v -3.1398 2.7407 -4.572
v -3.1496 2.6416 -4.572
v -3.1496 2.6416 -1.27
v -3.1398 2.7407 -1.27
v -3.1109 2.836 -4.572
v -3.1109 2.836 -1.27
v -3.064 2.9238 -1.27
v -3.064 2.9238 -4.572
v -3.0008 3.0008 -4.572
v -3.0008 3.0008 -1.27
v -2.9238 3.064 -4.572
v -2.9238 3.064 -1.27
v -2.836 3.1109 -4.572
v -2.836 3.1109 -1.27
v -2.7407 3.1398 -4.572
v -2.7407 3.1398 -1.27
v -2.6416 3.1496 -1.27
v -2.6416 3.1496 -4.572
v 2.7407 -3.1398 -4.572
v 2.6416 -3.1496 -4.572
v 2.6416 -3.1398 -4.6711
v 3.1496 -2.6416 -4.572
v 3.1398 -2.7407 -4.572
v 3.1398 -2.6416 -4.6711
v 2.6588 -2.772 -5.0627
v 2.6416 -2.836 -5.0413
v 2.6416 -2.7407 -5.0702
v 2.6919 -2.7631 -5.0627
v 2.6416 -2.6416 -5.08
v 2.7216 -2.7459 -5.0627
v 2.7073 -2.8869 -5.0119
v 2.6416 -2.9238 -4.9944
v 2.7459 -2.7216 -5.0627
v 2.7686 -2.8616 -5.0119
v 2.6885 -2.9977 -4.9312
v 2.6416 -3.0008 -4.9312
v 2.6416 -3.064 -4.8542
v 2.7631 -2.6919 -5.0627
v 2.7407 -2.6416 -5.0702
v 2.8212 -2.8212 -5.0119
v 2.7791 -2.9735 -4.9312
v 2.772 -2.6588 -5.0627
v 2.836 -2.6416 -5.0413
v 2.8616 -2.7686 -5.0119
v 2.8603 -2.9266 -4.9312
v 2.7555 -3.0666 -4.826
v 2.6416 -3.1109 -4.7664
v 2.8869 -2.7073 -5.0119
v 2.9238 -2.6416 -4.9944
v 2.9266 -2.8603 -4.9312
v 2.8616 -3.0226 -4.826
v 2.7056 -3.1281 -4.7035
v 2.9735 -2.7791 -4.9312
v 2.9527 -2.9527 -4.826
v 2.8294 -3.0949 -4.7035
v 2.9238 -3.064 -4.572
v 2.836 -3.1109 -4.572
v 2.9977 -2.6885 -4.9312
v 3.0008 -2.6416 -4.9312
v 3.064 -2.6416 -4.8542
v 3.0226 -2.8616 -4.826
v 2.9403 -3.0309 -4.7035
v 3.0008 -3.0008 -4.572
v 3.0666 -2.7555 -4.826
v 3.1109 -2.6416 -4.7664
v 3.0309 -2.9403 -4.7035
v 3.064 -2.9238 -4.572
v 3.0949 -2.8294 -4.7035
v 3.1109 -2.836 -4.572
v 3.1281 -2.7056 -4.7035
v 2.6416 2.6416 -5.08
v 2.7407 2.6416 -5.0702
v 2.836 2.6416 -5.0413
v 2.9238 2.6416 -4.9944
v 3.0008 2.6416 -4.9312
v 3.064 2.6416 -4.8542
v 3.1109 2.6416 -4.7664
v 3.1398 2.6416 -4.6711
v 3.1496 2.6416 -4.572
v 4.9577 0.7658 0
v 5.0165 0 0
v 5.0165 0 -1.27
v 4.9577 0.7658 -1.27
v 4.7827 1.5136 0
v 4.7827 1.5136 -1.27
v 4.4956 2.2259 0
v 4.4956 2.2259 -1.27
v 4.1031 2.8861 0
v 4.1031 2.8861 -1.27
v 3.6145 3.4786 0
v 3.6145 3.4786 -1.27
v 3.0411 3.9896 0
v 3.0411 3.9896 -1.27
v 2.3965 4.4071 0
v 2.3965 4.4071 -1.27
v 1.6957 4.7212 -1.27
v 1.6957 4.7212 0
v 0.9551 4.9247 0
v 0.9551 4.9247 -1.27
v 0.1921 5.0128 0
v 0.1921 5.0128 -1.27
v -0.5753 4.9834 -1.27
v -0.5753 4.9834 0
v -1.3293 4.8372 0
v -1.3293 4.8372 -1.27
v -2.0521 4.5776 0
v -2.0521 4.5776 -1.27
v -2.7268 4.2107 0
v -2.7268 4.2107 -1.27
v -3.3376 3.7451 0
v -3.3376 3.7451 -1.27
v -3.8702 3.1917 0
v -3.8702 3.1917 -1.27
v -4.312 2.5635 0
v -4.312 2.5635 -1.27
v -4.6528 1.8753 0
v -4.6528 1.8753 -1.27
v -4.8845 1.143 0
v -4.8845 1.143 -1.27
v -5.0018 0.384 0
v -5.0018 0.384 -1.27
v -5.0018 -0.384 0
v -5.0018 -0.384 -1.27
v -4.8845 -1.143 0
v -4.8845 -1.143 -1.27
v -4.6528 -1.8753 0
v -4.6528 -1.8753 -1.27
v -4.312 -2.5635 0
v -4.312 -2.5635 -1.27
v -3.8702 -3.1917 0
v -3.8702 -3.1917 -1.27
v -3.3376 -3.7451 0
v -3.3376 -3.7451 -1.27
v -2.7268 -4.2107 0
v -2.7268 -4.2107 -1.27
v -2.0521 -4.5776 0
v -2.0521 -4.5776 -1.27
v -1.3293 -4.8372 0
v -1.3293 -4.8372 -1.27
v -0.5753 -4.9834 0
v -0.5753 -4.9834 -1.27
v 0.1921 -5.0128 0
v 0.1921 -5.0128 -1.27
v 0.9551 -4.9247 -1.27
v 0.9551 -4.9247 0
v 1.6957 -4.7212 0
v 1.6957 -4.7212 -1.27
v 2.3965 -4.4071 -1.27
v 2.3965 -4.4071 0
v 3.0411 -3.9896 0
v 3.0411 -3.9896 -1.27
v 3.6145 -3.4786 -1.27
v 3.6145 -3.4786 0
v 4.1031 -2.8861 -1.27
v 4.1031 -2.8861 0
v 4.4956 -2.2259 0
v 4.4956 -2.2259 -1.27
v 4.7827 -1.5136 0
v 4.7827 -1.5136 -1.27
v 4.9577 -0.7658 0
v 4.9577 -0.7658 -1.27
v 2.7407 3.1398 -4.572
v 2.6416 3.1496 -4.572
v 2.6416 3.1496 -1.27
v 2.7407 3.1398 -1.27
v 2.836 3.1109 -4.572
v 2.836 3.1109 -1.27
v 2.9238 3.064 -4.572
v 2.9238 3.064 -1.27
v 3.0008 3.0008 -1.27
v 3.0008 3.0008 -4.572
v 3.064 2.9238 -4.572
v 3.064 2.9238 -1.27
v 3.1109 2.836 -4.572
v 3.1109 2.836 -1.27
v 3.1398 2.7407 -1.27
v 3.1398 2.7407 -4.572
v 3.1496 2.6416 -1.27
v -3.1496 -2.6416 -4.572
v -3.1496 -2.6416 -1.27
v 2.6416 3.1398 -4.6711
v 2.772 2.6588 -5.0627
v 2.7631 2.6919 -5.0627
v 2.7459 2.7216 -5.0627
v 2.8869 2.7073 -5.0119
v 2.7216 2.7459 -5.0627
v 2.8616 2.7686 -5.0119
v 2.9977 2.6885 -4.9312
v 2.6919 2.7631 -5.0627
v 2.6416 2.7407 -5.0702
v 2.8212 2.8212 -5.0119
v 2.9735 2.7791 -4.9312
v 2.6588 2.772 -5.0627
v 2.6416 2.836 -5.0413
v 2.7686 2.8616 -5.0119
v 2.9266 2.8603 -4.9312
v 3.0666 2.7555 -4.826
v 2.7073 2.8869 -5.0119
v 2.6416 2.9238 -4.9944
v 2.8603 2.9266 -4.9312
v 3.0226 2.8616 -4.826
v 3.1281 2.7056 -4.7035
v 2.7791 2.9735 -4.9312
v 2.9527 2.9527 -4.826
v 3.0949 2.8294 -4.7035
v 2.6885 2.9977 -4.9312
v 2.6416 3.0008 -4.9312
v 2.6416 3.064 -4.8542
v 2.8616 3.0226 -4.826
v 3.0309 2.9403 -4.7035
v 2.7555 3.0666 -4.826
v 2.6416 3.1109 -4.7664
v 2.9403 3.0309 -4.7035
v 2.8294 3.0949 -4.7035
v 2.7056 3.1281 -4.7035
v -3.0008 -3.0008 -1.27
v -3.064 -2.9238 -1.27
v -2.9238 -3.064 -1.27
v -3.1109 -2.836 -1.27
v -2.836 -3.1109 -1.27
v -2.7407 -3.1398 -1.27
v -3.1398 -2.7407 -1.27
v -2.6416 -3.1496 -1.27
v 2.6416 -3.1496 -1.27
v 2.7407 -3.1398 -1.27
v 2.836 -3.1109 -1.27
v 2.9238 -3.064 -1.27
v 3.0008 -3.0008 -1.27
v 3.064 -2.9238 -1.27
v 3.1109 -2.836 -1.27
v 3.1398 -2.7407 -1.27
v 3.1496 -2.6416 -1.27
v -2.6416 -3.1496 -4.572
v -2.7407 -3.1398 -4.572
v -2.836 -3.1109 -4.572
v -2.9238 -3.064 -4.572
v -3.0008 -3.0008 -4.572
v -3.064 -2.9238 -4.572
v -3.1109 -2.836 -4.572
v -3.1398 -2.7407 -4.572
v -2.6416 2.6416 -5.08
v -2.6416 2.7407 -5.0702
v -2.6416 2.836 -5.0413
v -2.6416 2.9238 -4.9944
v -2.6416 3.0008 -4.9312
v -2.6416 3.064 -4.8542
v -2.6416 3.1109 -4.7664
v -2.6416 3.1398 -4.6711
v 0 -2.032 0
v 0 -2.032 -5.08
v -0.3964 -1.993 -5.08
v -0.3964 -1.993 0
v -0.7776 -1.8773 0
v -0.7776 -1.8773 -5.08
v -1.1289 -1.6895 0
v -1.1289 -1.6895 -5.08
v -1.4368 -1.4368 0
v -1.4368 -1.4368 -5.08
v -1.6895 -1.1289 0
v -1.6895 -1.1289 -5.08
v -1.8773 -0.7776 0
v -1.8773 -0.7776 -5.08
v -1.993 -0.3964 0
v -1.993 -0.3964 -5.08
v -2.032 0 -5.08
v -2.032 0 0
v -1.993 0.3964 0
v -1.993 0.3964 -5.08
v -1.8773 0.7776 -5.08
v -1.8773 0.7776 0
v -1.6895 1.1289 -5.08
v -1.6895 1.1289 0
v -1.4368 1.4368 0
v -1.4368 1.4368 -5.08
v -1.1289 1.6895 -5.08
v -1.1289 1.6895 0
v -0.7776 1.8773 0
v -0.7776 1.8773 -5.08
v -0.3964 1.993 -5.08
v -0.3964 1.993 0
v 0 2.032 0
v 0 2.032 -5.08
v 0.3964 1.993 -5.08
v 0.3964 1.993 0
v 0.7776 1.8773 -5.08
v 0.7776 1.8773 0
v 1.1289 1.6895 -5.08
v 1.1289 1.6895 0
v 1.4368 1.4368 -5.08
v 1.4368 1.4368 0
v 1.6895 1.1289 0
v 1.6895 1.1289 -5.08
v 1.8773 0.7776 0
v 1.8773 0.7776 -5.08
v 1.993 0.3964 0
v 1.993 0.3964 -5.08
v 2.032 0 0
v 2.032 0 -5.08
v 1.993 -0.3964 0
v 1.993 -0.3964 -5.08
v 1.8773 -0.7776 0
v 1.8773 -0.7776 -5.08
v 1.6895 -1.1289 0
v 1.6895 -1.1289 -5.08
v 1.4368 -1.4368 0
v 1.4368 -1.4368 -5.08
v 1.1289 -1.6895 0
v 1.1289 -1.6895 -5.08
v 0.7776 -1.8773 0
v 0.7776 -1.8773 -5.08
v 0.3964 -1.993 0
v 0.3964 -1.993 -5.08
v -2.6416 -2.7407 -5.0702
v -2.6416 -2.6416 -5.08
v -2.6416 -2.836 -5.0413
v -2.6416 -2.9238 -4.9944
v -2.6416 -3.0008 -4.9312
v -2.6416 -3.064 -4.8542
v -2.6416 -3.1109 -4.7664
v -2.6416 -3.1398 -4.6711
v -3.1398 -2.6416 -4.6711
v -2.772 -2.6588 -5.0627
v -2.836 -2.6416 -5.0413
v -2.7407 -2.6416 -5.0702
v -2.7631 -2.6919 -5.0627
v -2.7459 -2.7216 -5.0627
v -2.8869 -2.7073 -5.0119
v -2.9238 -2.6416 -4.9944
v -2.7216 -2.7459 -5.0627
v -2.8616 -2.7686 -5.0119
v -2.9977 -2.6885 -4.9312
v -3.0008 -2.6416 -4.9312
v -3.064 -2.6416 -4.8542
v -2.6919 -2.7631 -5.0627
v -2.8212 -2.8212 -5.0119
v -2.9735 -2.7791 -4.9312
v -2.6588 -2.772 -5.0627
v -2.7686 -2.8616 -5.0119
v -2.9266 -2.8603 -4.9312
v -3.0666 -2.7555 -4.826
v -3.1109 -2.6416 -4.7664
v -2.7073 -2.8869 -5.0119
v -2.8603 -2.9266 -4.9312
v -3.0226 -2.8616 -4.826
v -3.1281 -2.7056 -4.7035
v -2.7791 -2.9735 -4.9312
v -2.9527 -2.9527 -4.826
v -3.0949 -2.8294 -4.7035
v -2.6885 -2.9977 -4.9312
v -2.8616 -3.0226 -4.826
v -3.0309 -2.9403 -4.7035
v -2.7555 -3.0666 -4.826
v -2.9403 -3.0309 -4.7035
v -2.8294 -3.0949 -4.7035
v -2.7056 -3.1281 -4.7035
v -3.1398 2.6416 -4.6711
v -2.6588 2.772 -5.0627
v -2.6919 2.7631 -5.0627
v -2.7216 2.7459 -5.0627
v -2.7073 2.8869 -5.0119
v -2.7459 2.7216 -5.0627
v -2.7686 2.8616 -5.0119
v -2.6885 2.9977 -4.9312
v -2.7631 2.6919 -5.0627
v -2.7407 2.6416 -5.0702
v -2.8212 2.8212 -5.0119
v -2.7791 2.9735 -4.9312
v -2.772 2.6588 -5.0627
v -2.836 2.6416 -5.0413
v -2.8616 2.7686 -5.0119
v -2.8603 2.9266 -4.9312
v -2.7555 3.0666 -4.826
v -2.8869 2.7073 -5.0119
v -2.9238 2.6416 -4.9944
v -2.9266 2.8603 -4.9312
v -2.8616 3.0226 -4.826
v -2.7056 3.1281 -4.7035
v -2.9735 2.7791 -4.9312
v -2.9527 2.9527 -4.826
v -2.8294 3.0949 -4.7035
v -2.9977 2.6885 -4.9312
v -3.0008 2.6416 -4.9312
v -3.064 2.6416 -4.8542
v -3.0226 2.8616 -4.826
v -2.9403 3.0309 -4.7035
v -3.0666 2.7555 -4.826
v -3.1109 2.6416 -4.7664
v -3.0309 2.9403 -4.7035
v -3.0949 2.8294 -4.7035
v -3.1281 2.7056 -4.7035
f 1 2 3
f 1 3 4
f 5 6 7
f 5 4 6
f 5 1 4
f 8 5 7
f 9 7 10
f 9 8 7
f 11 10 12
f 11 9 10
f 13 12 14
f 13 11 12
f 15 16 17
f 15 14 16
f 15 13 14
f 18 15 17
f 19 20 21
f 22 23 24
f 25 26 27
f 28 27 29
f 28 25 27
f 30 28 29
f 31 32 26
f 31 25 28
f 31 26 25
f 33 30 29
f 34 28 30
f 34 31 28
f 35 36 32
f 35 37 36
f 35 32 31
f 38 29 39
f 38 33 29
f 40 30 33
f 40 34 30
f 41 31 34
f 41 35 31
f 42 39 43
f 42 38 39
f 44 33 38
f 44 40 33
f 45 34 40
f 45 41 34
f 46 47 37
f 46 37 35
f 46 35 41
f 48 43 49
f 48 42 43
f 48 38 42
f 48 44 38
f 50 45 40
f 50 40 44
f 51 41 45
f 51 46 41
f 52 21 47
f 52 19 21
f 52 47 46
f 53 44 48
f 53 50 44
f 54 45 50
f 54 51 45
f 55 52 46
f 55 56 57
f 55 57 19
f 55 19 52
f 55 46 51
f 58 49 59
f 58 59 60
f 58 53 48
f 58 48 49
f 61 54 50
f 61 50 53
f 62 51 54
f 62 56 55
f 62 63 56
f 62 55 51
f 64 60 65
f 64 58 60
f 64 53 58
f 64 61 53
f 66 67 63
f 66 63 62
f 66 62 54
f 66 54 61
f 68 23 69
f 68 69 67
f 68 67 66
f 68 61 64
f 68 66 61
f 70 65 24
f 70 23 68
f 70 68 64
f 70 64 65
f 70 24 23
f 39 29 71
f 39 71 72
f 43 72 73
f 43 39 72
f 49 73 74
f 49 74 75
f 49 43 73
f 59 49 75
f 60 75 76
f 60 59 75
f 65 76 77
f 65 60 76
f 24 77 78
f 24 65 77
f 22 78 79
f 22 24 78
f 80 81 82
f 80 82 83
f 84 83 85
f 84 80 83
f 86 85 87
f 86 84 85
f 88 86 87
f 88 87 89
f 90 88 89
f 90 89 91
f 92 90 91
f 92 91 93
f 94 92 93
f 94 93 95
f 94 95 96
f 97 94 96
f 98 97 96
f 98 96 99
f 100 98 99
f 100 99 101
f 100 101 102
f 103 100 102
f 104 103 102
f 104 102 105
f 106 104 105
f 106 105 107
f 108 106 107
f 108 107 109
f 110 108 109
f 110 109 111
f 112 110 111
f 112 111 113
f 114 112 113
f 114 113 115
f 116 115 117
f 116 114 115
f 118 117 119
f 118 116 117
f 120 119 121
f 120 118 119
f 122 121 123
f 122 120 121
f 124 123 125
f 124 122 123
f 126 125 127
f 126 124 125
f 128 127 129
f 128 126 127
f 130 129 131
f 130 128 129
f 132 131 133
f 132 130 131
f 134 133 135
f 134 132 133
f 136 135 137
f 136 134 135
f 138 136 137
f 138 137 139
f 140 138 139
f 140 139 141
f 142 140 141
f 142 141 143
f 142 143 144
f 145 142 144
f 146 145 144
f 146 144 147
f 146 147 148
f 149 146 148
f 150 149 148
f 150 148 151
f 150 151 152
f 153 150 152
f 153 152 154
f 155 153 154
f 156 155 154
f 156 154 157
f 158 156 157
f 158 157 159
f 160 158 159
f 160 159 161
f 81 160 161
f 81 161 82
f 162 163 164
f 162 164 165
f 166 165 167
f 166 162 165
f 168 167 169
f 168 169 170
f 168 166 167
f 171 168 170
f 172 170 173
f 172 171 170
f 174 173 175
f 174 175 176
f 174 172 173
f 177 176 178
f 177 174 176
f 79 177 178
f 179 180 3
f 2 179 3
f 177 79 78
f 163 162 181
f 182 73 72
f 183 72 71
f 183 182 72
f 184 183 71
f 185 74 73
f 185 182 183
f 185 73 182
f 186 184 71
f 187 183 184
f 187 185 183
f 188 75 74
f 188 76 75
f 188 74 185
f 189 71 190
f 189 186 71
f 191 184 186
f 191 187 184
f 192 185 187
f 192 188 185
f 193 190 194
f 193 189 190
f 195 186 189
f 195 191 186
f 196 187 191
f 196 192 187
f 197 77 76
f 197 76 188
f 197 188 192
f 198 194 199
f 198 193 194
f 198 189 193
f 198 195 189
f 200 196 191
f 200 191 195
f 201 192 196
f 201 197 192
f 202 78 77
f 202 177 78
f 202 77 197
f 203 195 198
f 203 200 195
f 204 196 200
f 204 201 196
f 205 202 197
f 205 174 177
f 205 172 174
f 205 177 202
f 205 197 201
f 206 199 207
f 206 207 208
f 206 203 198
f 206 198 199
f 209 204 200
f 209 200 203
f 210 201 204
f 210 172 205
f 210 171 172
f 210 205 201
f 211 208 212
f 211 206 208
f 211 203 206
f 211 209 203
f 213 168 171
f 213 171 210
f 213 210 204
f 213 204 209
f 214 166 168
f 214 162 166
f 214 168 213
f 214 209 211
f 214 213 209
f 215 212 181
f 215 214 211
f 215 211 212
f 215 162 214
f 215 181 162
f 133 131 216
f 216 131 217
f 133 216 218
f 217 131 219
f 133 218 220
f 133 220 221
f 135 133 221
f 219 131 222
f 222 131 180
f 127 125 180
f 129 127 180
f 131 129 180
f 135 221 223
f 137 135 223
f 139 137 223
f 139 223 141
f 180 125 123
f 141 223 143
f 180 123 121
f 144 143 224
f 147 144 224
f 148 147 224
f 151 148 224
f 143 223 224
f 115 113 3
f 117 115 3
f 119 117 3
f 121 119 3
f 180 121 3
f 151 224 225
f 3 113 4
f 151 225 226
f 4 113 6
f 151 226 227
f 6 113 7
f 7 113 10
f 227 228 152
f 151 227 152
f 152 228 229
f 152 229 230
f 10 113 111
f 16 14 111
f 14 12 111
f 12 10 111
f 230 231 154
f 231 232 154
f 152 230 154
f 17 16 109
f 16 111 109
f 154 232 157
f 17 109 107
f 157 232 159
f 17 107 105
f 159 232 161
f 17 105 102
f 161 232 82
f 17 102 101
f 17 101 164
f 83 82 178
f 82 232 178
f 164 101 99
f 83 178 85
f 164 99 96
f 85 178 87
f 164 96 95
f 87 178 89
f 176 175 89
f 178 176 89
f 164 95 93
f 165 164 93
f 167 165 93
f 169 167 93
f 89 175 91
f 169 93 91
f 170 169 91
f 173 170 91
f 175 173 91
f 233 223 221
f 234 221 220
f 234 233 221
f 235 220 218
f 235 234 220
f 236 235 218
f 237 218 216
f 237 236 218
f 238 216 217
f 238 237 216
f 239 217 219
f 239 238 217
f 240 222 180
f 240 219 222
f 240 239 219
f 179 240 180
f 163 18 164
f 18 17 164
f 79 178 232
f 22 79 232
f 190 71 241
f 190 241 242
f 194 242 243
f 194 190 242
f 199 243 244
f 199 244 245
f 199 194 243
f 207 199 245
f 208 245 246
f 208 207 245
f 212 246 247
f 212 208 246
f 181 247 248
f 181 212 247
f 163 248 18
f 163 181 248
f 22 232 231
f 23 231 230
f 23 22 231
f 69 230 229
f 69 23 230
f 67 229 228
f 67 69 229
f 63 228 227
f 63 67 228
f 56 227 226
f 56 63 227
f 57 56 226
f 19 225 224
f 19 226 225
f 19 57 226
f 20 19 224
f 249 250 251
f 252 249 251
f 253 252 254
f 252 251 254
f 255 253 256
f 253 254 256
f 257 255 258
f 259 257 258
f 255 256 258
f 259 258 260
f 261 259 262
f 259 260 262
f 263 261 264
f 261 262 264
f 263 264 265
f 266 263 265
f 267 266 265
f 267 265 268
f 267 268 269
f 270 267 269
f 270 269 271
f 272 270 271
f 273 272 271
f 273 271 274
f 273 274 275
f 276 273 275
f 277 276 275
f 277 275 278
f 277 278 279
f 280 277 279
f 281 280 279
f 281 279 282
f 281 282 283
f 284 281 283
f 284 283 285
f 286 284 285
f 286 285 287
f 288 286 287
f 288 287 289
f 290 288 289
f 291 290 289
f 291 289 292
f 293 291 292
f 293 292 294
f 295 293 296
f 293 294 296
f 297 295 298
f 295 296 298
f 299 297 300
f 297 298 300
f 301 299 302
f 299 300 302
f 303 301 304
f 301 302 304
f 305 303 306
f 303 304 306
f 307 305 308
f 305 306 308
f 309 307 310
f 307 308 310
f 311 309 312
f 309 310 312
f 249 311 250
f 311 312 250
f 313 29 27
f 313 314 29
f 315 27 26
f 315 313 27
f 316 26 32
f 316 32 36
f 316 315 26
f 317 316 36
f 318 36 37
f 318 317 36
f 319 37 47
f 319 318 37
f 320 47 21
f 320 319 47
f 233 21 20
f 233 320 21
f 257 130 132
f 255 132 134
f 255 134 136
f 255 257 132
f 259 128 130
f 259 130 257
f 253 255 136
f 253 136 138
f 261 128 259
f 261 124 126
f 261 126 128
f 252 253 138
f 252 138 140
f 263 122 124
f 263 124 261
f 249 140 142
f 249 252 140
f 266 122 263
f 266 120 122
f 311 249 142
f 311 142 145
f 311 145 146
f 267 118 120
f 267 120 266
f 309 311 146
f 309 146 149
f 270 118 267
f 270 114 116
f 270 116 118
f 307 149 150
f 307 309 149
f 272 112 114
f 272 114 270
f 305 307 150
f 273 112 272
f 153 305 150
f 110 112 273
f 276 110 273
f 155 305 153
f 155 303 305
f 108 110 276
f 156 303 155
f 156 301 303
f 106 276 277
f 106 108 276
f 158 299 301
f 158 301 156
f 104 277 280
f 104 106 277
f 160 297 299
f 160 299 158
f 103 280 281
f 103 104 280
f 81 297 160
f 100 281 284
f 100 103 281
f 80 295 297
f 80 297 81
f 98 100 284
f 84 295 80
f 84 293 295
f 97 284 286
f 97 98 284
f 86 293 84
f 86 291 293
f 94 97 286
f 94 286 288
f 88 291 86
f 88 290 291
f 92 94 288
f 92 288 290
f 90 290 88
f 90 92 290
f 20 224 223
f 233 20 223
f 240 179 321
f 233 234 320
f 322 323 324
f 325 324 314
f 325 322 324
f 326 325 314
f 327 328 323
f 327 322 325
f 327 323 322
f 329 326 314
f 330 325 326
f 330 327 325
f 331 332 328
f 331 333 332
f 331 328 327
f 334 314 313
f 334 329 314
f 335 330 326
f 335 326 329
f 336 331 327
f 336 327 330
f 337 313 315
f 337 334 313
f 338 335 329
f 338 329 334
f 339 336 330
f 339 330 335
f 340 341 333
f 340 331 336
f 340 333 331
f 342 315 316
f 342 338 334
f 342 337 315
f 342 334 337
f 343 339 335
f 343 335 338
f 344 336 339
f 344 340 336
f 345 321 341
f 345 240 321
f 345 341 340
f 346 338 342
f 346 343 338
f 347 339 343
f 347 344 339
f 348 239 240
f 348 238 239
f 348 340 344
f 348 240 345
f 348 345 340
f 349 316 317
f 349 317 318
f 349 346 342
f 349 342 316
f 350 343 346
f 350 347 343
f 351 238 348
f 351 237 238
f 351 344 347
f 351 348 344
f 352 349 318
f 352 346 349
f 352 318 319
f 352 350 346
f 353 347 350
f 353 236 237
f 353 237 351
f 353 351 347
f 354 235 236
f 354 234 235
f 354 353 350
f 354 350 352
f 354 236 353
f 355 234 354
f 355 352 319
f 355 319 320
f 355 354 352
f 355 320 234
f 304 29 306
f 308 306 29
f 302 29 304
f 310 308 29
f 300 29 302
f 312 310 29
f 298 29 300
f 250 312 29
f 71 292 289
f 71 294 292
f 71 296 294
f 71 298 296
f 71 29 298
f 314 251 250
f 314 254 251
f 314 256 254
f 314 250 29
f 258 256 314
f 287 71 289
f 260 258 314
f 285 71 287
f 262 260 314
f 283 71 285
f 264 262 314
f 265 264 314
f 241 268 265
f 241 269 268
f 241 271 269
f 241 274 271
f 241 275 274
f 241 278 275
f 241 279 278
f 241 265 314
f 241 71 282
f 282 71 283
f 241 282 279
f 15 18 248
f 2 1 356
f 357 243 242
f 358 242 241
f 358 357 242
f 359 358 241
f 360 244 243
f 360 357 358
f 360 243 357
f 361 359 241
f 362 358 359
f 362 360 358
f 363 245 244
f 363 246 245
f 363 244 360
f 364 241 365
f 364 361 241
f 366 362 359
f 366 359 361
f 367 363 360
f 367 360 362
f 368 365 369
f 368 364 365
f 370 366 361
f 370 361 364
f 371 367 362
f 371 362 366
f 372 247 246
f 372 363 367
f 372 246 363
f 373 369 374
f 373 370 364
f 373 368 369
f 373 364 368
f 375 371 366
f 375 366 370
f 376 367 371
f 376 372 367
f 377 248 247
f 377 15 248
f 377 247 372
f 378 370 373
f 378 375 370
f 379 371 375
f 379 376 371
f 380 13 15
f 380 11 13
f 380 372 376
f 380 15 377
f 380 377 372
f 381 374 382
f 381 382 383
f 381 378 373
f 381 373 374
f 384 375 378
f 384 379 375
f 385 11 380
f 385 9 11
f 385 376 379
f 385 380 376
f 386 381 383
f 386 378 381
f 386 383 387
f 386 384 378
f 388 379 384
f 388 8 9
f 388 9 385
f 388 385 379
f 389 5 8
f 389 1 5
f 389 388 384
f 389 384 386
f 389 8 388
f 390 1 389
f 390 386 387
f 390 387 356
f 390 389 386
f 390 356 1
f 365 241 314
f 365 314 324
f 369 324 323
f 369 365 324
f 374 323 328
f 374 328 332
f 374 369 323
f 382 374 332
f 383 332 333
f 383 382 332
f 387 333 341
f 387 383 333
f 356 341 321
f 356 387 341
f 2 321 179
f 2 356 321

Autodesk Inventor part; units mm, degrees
ref_plane "YZ Plane" through (0, 0, 0) normal (1, 0, 0) x (0, 1, 0)
ref_plane "XZ Plane" through (0, 0, 0) normal (0, 1, 0) x (-1, 0, 0)
ref_plane "XY Plane" through (0, 0, 0) normal (0, 0, 1) x (1, 0, 0)
sketch "Sketch1" plane through (0, 0, 0) normal (0, 0, 1) x (1, 0, 0)
  circle A0 centre (0, 0) radius 5.0165
  dimension "d0" = 10.033
extrude "Extrusion1" add sketch "Sketch1" against normal blind 1.27
sketch "Sketch2" plane through (0, 0, -1.27) normal (0, 0, -1) x (-1, 0, 0)
  circle A0 centre (0, 0) radius 5.0165 projected
  line L0 (-3.1496, -3.1496) -> (3.1496, -3.1496)
  line L1 (3.1496, -3.1496) -> (3.1496, 3.1496)
  line L2 (3.1496, 3.1496) -> (-3.1496, 3.1496)
  line L3 (-3.1496, 3.1496) -> (-3.1496, -3.1496)
  point P0 (0, 3.1496)
  point P1 (-3.1496, 0)
  dimension "d3" = 6.2992
extrude "Extrusion2" add sketch "Sketch2" along normal blind 3.81 contours L3 L2 L1 L0
fillet "Fillet1" radius 0.508 8 edges at (3.1496, 3.1496, -3.175) (-3.1496, 3.1496, -3.175) (-3.1496, -3.1496, -3.175) (3.1496, -3.1496, -3.175) (3.1496, 0, -5.08) (0, 3.1496, -5.08) (-3.1496, 0, -5.08) (0, -3.1496, -5.08)
sketch "Sketch3" plane through (0, 0, 0) normal (0, 0, 1) x (1, 0, 0)
  circle A0 centre (0, 0) radius 5.0165 projected
hole "Hole1" at (0, 0, 0) direction (0, 0, -1) diameter 4.064 end through all
properties part number "Free Spinning Gear Insert" material "Acetal Resin, White"
